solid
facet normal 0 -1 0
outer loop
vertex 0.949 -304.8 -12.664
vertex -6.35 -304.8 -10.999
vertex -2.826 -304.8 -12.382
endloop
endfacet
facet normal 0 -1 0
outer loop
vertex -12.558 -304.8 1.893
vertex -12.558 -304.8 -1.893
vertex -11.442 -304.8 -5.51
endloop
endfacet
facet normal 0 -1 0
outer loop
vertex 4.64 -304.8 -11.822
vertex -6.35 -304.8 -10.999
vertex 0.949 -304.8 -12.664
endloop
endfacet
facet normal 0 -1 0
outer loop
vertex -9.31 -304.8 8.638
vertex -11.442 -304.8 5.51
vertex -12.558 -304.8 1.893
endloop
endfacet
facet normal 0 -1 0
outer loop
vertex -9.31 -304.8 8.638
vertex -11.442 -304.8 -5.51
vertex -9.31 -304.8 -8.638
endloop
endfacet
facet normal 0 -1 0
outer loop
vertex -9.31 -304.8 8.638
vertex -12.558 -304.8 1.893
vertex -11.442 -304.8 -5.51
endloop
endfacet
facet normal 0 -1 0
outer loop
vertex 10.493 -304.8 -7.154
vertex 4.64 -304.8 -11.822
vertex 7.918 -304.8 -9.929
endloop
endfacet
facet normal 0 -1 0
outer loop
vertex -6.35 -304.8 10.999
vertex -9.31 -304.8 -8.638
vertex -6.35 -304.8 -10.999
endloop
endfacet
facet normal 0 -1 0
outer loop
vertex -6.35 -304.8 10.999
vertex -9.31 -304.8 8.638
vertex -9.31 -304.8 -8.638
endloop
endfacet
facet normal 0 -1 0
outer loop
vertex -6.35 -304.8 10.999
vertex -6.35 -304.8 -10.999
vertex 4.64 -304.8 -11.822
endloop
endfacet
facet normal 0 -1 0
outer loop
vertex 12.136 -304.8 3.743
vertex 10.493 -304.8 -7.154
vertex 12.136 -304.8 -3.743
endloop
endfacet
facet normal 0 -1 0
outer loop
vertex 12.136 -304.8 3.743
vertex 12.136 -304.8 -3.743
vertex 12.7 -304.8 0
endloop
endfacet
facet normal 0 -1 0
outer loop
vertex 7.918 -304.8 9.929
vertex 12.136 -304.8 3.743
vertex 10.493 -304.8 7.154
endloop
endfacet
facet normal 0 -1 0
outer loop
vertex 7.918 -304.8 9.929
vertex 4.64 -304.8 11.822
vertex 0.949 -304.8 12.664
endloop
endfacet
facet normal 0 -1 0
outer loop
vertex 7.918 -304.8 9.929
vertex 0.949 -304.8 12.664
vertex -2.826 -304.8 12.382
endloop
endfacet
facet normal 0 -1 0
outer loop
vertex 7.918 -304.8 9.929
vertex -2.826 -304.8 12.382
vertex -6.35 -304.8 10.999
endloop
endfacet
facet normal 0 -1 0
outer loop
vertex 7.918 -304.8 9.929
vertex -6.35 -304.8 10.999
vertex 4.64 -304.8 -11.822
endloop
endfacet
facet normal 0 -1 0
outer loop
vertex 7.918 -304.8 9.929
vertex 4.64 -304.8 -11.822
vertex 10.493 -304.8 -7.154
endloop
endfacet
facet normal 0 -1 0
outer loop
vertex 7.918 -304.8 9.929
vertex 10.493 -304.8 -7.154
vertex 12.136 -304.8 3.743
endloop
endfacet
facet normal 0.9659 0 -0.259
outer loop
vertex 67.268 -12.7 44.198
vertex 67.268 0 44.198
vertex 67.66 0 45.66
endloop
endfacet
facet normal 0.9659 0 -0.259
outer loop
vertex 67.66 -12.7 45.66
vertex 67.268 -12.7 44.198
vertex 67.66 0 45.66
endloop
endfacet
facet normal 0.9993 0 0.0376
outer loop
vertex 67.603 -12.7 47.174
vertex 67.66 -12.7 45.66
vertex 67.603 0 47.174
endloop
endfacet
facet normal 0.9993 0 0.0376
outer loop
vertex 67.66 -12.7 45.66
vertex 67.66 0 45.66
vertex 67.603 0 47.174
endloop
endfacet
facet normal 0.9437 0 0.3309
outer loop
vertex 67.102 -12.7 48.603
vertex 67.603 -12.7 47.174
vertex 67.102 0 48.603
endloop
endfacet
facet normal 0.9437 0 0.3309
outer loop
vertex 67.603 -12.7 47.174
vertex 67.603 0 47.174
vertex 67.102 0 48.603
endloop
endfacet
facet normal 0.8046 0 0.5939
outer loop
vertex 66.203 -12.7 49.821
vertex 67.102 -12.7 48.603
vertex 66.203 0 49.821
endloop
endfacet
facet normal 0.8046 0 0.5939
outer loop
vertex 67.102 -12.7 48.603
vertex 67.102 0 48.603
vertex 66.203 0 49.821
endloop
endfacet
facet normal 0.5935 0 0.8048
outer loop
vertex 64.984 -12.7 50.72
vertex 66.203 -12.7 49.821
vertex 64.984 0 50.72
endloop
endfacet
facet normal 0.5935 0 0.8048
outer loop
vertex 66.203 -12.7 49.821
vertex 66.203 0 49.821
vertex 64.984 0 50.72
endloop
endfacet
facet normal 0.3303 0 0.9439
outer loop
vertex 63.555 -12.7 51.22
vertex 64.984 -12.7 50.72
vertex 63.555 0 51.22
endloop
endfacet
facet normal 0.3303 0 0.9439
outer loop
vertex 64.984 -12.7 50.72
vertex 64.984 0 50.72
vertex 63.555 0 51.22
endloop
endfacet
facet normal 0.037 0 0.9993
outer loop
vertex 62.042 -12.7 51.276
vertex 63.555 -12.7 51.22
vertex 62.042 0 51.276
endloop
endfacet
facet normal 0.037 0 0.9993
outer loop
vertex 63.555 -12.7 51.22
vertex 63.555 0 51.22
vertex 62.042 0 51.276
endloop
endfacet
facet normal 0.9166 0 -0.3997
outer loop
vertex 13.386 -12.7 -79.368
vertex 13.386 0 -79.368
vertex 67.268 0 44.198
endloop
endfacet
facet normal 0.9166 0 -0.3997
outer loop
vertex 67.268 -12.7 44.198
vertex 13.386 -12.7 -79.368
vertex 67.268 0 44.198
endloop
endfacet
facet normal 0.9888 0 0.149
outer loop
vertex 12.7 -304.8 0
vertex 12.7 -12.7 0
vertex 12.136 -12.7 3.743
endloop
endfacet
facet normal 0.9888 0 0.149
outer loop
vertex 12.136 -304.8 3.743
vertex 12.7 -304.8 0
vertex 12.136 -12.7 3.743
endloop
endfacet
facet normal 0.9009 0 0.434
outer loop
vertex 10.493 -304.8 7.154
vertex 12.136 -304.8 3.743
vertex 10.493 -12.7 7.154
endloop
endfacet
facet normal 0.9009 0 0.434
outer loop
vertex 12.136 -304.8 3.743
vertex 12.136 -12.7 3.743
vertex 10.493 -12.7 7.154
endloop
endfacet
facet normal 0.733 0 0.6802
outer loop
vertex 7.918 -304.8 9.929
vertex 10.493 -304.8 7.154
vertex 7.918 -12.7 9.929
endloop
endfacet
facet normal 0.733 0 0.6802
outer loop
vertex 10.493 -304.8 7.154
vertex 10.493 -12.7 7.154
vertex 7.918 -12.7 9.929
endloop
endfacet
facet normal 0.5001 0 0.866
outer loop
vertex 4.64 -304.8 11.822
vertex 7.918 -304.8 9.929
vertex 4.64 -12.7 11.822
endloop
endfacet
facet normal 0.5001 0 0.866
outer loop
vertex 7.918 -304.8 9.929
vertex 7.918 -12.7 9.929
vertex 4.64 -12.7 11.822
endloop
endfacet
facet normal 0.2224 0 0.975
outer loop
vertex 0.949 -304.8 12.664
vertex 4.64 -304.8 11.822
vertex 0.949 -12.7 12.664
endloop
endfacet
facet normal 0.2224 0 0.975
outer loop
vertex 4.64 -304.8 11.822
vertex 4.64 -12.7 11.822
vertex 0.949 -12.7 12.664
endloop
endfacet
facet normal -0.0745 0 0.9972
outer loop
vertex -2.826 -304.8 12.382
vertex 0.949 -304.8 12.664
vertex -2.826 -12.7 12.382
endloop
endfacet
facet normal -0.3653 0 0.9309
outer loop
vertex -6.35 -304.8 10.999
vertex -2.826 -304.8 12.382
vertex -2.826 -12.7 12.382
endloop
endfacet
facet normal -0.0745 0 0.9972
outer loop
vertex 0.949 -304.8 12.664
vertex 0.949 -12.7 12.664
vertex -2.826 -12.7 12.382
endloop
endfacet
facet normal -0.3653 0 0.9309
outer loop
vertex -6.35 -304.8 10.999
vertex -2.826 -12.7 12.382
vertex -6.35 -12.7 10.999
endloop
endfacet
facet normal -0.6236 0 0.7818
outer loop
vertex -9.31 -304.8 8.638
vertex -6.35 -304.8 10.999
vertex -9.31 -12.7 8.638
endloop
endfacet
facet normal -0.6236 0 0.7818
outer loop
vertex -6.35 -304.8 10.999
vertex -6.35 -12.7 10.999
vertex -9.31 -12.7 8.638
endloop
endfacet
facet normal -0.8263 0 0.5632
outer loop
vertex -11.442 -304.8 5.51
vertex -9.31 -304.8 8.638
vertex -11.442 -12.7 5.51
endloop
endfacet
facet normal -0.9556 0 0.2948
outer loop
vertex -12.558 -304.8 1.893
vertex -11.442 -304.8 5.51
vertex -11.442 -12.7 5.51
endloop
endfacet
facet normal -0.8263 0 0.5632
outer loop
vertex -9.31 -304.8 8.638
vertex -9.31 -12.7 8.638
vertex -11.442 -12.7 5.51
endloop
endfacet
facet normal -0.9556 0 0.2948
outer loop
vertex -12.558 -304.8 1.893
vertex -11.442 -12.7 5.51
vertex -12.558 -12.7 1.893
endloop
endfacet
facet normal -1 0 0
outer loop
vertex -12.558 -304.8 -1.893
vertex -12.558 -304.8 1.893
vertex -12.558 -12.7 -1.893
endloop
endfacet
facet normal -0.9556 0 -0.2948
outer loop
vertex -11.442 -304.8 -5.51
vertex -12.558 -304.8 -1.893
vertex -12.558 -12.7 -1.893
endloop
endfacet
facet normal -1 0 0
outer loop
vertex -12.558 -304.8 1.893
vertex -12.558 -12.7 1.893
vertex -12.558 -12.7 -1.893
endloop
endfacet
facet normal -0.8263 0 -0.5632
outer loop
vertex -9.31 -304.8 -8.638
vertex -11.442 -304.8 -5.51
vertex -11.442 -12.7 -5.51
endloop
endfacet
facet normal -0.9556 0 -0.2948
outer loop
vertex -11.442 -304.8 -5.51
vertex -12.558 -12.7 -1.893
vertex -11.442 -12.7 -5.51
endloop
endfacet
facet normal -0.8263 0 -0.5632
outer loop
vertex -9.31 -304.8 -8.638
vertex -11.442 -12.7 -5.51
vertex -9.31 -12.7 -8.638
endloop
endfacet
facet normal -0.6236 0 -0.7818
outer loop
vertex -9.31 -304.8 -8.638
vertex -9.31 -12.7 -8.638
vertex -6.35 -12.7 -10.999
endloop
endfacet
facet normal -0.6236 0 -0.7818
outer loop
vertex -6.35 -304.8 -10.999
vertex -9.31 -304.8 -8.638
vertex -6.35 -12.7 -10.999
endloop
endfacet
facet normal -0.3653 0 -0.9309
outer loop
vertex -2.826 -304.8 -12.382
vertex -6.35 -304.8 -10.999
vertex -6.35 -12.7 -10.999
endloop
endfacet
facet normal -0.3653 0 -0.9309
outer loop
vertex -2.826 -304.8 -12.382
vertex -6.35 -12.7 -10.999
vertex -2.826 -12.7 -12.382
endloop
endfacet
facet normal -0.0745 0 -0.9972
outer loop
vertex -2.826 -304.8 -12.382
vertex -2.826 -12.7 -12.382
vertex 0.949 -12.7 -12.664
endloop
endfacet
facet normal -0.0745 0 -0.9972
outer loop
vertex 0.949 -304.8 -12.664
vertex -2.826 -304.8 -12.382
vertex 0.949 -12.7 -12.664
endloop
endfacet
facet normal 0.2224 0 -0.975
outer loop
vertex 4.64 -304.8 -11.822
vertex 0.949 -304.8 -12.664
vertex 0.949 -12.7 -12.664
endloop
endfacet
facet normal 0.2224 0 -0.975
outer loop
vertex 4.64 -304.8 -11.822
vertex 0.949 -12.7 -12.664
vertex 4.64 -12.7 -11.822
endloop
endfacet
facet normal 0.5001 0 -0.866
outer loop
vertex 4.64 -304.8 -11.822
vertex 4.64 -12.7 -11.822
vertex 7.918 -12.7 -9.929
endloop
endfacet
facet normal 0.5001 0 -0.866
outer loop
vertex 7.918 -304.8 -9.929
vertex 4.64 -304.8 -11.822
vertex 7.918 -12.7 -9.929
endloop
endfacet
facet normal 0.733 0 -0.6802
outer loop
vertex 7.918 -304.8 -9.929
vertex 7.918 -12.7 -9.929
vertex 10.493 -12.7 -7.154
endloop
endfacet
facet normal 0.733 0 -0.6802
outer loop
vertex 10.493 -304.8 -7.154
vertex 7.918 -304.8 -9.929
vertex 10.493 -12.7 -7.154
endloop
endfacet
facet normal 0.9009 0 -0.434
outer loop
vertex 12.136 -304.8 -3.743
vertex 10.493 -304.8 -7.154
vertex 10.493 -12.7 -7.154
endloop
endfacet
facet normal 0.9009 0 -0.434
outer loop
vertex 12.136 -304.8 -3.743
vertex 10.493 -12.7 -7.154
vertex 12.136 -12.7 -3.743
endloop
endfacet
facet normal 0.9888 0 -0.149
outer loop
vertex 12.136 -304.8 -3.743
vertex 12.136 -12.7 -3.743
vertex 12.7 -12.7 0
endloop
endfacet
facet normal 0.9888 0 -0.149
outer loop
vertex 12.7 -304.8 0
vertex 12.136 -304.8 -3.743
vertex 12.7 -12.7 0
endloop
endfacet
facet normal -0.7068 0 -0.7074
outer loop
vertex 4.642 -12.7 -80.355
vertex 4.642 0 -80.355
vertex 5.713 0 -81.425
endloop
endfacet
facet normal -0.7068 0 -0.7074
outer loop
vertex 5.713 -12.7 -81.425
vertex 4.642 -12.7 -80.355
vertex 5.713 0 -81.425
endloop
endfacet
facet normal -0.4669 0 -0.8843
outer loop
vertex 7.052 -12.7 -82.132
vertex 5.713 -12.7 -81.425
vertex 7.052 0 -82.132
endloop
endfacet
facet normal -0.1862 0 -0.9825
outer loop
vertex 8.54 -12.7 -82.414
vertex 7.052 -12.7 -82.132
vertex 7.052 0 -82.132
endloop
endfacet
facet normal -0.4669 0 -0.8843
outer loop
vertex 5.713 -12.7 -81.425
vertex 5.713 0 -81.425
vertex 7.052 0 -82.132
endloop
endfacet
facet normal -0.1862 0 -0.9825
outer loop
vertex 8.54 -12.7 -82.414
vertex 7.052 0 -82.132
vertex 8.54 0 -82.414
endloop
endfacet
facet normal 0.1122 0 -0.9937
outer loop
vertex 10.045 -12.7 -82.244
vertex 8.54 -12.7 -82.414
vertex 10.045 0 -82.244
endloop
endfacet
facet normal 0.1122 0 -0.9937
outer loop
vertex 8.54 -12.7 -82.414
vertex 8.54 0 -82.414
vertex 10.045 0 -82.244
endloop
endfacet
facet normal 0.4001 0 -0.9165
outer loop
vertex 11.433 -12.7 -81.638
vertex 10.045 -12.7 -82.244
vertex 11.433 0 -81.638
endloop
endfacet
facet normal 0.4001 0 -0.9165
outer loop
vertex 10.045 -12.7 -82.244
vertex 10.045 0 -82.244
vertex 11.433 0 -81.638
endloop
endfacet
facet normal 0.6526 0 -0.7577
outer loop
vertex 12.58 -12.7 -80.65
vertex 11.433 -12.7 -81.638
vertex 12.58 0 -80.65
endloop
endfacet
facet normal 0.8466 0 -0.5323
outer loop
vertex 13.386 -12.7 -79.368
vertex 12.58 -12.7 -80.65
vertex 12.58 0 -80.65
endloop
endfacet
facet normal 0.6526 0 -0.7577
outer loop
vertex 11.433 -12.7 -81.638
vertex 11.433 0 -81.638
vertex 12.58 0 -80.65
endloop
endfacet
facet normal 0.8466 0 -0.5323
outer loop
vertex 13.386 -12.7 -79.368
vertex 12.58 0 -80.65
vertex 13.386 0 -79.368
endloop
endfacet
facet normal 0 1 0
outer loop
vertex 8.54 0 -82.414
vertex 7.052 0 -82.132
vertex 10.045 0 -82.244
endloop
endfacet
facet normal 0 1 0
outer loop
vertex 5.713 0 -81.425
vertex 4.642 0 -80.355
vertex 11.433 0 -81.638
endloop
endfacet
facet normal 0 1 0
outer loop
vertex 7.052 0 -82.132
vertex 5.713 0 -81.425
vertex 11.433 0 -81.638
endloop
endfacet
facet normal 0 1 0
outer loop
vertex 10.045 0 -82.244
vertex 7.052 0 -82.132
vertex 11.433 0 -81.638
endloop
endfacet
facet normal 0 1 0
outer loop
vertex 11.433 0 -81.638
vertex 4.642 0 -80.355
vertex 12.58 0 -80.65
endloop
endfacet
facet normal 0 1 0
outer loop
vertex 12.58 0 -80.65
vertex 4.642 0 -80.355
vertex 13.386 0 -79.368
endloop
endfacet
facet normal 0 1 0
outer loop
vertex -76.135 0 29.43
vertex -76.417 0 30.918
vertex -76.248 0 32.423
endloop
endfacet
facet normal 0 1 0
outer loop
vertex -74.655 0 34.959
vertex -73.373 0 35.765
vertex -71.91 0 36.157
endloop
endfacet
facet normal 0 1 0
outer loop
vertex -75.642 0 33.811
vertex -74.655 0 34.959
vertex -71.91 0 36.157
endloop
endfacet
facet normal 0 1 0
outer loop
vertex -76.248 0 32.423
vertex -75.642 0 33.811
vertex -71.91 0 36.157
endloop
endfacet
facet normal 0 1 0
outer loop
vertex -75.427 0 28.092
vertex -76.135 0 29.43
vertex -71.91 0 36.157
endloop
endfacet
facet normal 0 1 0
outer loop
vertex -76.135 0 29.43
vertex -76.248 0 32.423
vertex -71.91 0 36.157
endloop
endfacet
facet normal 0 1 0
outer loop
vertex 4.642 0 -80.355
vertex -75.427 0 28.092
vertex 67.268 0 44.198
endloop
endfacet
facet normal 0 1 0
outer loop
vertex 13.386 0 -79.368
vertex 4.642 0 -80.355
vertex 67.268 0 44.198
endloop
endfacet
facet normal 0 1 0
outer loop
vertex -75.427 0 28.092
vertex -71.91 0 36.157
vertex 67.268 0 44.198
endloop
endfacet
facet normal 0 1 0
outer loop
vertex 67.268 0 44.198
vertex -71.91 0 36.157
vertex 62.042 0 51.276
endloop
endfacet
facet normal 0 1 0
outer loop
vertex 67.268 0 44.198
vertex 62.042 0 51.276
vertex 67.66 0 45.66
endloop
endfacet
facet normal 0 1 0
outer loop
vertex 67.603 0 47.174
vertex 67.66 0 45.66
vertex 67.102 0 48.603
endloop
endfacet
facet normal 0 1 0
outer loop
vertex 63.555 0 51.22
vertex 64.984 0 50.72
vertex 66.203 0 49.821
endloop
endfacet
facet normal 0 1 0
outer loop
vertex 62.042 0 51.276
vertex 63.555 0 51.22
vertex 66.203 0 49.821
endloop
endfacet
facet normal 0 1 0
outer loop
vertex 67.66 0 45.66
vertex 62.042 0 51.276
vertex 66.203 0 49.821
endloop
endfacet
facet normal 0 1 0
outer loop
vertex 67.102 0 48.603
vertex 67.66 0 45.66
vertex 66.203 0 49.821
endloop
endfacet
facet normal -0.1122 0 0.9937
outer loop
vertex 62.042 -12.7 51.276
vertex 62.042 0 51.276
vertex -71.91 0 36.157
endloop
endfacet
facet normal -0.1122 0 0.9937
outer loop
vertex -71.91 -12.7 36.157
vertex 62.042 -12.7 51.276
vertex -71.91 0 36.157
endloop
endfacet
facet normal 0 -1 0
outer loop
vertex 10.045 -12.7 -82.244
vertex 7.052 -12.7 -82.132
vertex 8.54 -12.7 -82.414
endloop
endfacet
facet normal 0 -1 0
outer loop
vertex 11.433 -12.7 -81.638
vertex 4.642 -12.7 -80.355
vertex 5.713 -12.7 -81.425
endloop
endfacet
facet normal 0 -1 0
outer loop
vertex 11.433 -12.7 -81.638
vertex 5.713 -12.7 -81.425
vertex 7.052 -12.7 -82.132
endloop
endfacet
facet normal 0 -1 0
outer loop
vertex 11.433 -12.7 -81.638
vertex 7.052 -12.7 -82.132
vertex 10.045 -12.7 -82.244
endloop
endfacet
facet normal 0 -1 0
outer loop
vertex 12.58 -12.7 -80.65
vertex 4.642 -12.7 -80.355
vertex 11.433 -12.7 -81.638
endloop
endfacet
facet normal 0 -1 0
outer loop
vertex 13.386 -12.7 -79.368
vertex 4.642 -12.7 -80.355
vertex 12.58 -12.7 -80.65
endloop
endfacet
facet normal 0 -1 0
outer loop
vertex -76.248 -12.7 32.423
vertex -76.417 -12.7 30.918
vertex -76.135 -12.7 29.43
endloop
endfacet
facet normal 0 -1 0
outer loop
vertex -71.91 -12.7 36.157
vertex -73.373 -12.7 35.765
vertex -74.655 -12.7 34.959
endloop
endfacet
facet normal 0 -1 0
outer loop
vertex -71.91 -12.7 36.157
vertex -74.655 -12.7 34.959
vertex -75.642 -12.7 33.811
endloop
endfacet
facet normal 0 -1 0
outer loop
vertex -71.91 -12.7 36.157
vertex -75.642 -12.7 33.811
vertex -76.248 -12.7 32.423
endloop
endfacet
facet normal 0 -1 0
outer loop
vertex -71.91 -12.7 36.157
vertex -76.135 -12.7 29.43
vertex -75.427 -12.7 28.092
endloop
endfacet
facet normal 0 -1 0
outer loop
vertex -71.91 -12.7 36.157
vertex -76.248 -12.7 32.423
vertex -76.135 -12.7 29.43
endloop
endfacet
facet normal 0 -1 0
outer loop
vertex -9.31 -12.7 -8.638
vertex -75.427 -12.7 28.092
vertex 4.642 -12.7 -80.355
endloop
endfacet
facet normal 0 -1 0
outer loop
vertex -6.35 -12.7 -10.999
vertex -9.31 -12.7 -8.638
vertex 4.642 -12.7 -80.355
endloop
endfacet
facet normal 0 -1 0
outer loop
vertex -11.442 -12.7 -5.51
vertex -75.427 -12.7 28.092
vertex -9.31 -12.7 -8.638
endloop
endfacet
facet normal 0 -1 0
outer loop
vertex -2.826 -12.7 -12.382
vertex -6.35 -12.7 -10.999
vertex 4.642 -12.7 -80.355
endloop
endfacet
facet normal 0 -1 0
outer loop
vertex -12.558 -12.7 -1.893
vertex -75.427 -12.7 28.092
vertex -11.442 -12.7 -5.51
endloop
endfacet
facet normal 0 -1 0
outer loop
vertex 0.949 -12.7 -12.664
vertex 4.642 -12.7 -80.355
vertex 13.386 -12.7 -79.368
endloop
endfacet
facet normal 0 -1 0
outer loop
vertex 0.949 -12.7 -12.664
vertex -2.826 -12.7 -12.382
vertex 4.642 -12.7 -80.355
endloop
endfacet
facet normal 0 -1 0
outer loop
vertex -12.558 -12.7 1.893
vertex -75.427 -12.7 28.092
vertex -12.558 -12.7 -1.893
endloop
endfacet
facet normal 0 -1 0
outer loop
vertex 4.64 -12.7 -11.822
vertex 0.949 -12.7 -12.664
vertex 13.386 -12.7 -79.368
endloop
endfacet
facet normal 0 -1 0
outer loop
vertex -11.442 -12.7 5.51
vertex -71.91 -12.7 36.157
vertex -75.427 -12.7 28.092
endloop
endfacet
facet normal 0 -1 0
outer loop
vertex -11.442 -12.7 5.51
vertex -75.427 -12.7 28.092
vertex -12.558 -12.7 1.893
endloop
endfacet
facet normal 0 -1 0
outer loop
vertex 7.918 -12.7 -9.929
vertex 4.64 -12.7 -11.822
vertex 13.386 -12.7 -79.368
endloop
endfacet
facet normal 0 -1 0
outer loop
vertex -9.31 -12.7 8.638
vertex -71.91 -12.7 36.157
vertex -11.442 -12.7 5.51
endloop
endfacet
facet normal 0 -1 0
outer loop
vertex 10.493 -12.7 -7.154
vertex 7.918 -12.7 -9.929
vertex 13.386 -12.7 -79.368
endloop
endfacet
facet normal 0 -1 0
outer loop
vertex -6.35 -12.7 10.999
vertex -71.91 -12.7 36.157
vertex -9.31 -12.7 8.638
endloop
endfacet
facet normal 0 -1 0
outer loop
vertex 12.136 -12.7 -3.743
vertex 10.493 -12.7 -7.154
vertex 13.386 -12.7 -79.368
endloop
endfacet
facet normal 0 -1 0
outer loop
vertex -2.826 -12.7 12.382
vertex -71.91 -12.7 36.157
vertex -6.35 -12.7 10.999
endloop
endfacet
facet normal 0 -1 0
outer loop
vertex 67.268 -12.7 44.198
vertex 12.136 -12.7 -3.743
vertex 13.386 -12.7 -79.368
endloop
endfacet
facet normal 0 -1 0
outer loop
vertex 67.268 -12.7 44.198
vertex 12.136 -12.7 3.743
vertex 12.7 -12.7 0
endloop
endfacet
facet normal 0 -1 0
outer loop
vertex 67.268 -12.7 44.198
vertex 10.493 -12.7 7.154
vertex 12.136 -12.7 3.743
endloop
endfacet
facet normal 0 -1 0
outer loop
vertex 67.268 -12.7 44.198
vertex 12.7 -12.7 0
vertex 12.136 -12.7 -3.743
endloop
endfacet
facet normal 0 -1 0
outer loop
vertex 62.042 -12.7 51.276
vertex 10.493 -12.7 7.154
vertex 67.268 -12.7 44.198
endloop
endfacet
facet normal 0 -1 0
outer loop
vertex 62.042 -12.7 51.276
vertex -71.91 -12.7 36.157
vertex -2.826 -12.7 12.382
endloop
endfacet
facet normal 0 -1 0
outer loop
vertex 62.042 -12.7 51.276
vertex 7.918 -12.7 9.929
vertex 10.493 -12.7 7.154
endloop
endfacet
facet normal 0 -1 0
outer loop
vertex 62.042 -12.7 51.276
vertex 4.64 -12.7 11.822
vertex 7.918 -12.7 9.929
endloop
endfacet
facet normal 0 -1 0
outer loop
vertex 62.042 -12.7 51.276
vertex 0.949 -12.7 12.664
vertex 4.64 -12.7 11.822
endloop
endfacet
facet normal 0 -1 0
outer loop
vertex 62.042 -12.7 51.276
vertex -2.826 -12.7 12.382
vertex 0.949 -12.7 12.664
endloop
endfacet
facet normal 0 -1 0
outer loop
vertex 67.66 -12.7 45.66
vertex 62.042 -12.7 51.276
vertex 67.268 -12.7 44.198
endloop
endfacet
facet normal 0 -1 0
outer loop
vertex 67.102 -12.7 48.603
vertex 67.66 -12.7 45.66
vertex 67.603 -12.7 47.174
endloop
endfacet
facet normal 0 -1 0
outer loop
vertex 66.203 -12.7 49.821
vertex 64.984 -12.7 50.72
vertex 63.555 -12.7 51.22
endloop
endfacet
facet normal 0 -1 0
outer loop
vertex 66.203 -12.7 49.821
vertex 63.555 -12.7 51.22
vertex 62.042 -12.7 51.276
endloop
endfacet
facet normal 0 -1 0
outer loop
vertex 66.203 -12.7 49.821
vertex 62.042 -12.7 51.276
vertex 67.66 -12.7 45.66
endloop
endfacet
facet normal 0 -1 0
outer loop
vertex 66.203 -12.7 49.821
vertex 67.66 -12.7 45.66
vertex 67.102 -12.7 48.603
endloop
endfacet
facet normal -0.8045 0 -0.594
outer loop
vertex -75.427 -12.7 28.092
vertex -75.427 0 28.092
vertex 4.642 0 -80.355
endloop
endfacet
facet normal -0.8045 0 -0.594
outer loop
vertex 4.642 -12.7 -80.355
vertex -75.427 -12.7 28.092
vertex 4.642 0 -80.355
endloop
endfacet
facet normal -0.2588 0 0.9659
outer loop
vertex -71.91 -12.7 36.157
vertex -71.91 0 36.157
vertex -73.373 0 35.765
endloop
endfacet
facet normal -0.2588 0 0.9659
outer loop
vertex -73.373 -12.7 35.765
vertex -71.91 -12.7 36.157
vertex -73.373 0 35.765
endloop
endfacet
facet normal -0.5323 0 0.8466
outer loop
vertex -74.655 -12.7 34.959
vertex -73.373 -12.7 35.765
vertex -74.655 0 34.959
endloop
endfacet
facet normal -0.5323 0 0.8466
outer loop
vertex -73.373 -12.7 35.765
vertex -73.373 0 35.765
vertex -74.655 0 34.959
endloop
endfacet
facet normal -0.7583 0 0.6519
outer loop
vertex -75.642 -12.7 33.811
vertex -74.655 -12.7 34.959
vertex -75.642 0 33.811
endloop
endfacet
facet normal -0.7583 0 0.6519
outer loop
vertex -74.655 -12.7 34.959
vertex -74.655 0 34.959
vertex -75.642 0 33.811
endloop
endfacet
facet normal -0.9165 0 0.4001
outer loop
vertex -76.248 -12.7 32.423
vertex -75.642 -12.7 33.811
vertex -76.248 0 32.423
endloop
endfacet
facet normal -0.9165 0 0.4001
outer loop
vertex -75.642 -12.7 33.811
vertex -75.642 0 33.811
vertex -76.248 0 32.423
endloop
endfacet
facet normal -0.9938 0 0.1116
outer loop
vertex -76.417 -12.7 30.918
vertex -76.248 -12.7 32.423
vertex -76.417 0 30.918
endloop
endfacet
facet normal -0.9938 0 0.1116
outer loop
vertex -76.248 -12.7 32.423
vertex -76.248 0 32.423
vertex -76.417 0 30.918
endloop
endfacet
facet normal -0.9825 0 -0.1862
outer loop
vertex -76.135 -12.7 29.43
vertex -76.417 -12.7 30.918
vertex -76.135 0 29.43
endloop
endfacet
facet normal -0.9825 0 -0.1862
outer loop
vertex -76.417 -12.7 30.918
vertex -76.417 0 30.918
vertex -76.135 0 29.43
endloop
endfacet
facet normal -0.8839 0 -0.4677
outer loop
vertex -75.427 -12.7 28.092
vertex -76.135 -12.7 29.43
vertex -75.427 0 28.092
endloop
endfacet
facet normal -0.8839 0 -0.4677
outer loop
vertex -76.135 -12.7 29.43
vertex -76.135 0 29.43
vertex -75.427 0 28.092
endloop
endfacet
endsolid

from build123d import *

# Parameters (mm, degrees)
F0_R     = 12.7
F1_DEPTH = 12.7
F2_DEPTH = 304.8


with BuildPart() as f1:
    # F0 (on Front) → F1 (new body)
    with BuildSketch(Plane.XZ):
        with BuildLine():
            Line((13.385539, -79.367668), (67.267937, 44.197556))
            ThreePointArc((67.267937, 44.197556), (66.698178, 49.245503), (62.041647, 51.276051))
            Line((62.041647, 51.276051), (-71.910175, 36.156965))
            ThreePointArc((-71.910175, 36.156965), (-75.996946, 33.139565), (-75.427186, 28.091617))
            Line((-75.427186, 28.091617), (4.642237, -80.35452))
            ThreePointArc((4.642237, -80.35452), (9.298768, -82.385068), (13.385539, -79.367668))
        make_face()
        Circle(F0_R, mode=Mode.SUBTRACT)
    extrude(amount=F1_DEPTH)

    # F0 (on Front) → F2 (join)
    with BuildSketch(Plane.XZ):
        Circle(F0_R)
    extrude(amount=F2_DEPTH)


solid = f1.part
